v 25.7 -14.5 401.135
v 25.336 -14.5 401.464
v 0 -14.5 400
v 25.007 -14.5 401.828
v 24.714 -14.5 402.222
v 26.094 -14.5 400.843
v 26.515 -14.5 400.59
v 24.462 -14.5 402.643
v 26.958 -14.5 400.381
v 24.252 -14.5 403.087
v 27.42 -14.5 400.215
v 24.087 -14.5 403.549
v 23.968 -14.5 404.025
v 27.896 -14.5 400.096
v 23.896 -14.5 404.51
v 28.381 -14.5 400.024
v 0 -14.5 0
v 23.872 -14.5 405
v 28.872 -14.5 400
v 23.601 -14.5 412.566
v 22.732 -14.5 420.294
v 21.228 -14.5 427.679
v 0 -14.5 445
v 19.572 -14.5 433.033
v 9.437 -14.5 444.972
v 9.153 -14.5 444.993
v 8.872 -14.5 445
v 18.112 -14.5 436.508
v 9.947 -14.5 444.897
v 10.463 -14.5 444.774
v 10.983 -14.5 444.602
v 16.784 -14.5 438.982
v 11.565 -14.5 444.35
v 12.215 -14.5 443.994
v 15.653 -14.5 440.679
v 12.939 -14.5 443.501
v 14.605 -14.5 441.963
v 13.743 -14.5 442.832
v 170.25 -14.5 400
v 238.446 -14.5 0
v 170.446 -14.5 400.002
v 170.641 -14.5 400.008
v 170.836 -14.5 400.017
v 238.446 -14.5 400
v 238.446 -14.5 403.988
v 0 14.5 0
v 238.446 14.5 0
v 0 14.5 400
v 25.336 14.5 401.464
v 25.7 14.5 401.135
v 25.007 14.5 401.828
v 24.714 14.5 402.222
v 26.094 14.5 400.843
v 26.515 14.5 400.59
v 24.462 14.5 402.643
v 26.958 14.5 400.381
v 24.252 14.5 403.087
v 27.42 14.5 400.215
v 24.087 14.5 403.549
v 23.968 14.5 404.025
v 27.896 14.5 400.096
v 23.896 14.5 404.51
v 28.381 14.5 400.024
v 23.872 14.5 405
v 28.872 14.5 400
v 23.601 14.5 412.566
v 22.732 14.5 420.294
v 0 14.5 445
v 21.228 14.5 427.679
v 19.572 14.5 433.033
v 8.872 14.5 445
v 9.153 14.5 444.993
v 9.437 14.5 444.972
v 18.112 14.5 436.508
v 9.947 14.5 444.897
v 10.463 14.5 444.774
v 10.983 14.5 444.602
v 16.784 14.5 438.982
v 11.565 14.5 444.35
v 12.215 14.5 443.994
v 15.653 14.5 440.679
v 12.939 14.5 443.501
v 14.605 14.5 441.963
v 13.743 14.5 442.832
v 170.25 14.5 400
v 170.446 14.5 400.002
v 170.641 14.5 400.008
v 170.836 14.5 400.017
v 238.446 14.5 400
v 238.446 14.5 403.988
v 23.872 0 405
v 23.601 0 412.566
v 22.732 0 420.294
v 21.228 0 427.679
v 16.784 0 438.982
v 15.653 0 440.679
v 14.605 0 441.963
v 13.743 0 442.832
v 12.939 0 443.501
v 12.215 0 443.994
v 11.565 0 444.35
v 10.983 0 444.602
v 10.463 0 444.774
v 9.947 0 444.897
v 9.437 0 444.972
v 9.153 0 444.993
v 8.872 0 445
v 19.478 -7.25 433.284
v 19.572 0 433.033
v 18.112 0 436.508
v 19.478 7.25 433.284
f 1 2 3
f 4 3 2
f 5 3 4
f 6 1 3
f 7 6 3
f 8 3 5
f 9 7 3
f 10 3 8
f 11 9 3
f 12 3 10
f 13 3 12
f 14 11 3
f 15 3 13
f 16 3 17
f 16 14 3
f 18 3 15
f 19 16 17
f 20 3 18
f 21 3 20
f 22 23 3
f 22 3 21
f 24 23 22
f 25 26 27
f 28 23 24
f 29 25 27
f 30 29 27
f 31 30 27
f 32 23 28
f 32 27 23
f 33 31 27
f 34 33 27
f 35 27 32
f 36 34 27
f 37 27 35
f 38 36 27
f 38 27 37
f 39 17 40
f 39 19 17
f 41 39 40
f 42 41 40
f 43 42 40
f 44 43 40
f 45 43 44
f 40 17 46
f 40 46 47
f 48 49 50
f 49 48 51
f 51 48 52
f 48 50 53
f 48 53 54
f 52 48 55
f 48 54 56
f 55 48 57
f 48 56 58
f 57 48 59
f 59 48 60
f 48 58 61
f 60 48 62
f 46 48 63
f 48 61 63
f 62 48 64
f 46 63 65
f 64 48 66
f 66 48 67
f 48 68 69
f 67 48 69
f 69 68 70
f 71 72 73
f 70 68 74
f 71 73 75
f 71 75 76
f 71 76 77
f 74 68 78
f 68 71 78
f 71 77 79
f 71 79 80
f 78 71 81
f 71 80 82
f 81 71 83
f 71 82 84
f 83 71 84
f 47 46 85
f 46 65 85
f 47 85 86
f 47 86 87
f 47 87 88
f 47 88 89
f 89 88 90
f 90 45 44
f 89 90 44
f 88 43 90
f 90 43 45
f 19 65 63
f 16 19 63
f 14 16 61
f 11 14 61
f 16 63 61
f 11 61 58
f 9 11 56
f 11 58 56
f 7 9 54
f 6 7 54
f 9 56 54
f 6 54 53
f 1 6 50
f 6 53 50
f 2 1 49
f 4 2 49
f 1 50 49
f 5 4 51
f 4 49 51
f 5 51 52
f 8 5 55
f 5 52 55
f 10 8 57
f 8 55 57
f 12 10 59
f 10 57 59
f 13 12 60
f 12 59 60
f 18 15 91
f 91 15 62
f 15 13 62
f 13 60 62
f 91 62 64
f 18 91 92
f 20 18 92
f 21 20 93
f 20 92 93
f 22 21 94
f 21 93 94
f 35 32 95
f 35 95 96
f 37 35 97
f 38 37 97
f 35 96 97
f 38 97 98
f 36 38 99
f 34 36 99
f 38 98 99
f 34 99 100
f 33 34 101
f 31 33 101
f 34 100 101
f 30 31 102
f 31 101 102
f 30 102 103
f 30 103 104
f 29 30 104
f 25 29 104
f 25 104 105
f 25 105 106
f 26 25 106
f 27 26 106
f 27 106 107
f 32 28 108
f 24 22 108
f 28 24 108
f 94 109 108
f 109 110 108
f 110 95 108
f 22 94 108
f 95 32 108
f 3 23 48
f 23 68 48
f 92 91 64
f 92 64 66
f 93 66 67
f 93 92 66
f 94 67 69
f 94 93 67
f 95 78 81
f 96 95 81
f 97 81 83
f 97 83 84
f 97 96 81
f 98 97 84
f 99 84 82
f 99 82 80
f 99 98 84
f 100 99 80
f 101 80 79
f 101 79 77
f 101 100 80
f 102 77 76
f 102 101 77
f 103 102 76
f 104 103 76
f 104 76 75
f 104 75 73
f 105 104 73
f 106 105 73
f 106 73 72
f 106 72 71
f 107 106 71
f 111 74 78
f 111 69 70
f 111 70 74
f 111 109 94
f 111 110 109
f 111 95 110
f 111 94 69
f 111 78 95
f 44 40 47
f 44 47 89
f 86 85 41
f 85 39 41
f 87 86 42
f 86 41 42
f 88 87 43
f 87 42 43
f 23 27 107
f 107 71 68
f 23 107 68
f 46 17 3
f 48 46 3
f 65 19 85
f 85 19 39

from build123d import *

# Parameters (mm, degrees)
EXTRUDE002_DEPTH = 14.5
SKETCH003_W      = 238.445661
SKETCH003_H      = 400
EXTRUDE001_DEPTH = 14.5


with BuildPart() as extrude002:
    # Sketch001 → Extrude002 (new body, symmetric)
    with BuildSketch(Plane(origin=(0, 0, 400), x_dir=(1, 0, 0), z_dir=(0, -1, 0))):
        with BuildLine():
            add(Edge.make_bspline(
                [(23.871579, 5), (23.871579, 45), (8.871579, 45)],
                knots=[4.712389, 4.712389, 4.712389, 6.283185, 6.283185, 6.283185], degree=2, weights=[1, 0.707107, 1]))
            Line((8.871579, 45), (0, 45))
            Line((0, 45), (0, 0))
            Line((0, 0), (28.871579, 0))
            ThreePointArc((28.871579, 0), (25.336045, 1.464466), (23.871579, 5))
        make_face()
        with BuildLine():
            Line((238.445661, 3.988383), (238.445661, 0))
            Line((238.445661, 0), (170.25, 0))
            ThreePointArc((170.25, 0), (170.543307, 0.004302), (170.836361, 0.017206))
            Line((170.836361, 0.017206), (238.445661, 3.988383))
        make_face()
    extrude(amount=EXTRUDE002_DEPTH, both=True)


with BuildPart() as basin_cut:
    # Sketch003 → Extrude001 (new body, symmetric)
    with BuildSketch(Plane.XZ):
        with Locations((119.222831, 200)):
            Rectangle(SKETCH003_W, SKETCH003_H)
    extrude(amount=EXTRUDE001_DEPTH, both=True)

    # Fusion: union Extrude002
    add(extrude002.part)


solid = basin_cut.part
